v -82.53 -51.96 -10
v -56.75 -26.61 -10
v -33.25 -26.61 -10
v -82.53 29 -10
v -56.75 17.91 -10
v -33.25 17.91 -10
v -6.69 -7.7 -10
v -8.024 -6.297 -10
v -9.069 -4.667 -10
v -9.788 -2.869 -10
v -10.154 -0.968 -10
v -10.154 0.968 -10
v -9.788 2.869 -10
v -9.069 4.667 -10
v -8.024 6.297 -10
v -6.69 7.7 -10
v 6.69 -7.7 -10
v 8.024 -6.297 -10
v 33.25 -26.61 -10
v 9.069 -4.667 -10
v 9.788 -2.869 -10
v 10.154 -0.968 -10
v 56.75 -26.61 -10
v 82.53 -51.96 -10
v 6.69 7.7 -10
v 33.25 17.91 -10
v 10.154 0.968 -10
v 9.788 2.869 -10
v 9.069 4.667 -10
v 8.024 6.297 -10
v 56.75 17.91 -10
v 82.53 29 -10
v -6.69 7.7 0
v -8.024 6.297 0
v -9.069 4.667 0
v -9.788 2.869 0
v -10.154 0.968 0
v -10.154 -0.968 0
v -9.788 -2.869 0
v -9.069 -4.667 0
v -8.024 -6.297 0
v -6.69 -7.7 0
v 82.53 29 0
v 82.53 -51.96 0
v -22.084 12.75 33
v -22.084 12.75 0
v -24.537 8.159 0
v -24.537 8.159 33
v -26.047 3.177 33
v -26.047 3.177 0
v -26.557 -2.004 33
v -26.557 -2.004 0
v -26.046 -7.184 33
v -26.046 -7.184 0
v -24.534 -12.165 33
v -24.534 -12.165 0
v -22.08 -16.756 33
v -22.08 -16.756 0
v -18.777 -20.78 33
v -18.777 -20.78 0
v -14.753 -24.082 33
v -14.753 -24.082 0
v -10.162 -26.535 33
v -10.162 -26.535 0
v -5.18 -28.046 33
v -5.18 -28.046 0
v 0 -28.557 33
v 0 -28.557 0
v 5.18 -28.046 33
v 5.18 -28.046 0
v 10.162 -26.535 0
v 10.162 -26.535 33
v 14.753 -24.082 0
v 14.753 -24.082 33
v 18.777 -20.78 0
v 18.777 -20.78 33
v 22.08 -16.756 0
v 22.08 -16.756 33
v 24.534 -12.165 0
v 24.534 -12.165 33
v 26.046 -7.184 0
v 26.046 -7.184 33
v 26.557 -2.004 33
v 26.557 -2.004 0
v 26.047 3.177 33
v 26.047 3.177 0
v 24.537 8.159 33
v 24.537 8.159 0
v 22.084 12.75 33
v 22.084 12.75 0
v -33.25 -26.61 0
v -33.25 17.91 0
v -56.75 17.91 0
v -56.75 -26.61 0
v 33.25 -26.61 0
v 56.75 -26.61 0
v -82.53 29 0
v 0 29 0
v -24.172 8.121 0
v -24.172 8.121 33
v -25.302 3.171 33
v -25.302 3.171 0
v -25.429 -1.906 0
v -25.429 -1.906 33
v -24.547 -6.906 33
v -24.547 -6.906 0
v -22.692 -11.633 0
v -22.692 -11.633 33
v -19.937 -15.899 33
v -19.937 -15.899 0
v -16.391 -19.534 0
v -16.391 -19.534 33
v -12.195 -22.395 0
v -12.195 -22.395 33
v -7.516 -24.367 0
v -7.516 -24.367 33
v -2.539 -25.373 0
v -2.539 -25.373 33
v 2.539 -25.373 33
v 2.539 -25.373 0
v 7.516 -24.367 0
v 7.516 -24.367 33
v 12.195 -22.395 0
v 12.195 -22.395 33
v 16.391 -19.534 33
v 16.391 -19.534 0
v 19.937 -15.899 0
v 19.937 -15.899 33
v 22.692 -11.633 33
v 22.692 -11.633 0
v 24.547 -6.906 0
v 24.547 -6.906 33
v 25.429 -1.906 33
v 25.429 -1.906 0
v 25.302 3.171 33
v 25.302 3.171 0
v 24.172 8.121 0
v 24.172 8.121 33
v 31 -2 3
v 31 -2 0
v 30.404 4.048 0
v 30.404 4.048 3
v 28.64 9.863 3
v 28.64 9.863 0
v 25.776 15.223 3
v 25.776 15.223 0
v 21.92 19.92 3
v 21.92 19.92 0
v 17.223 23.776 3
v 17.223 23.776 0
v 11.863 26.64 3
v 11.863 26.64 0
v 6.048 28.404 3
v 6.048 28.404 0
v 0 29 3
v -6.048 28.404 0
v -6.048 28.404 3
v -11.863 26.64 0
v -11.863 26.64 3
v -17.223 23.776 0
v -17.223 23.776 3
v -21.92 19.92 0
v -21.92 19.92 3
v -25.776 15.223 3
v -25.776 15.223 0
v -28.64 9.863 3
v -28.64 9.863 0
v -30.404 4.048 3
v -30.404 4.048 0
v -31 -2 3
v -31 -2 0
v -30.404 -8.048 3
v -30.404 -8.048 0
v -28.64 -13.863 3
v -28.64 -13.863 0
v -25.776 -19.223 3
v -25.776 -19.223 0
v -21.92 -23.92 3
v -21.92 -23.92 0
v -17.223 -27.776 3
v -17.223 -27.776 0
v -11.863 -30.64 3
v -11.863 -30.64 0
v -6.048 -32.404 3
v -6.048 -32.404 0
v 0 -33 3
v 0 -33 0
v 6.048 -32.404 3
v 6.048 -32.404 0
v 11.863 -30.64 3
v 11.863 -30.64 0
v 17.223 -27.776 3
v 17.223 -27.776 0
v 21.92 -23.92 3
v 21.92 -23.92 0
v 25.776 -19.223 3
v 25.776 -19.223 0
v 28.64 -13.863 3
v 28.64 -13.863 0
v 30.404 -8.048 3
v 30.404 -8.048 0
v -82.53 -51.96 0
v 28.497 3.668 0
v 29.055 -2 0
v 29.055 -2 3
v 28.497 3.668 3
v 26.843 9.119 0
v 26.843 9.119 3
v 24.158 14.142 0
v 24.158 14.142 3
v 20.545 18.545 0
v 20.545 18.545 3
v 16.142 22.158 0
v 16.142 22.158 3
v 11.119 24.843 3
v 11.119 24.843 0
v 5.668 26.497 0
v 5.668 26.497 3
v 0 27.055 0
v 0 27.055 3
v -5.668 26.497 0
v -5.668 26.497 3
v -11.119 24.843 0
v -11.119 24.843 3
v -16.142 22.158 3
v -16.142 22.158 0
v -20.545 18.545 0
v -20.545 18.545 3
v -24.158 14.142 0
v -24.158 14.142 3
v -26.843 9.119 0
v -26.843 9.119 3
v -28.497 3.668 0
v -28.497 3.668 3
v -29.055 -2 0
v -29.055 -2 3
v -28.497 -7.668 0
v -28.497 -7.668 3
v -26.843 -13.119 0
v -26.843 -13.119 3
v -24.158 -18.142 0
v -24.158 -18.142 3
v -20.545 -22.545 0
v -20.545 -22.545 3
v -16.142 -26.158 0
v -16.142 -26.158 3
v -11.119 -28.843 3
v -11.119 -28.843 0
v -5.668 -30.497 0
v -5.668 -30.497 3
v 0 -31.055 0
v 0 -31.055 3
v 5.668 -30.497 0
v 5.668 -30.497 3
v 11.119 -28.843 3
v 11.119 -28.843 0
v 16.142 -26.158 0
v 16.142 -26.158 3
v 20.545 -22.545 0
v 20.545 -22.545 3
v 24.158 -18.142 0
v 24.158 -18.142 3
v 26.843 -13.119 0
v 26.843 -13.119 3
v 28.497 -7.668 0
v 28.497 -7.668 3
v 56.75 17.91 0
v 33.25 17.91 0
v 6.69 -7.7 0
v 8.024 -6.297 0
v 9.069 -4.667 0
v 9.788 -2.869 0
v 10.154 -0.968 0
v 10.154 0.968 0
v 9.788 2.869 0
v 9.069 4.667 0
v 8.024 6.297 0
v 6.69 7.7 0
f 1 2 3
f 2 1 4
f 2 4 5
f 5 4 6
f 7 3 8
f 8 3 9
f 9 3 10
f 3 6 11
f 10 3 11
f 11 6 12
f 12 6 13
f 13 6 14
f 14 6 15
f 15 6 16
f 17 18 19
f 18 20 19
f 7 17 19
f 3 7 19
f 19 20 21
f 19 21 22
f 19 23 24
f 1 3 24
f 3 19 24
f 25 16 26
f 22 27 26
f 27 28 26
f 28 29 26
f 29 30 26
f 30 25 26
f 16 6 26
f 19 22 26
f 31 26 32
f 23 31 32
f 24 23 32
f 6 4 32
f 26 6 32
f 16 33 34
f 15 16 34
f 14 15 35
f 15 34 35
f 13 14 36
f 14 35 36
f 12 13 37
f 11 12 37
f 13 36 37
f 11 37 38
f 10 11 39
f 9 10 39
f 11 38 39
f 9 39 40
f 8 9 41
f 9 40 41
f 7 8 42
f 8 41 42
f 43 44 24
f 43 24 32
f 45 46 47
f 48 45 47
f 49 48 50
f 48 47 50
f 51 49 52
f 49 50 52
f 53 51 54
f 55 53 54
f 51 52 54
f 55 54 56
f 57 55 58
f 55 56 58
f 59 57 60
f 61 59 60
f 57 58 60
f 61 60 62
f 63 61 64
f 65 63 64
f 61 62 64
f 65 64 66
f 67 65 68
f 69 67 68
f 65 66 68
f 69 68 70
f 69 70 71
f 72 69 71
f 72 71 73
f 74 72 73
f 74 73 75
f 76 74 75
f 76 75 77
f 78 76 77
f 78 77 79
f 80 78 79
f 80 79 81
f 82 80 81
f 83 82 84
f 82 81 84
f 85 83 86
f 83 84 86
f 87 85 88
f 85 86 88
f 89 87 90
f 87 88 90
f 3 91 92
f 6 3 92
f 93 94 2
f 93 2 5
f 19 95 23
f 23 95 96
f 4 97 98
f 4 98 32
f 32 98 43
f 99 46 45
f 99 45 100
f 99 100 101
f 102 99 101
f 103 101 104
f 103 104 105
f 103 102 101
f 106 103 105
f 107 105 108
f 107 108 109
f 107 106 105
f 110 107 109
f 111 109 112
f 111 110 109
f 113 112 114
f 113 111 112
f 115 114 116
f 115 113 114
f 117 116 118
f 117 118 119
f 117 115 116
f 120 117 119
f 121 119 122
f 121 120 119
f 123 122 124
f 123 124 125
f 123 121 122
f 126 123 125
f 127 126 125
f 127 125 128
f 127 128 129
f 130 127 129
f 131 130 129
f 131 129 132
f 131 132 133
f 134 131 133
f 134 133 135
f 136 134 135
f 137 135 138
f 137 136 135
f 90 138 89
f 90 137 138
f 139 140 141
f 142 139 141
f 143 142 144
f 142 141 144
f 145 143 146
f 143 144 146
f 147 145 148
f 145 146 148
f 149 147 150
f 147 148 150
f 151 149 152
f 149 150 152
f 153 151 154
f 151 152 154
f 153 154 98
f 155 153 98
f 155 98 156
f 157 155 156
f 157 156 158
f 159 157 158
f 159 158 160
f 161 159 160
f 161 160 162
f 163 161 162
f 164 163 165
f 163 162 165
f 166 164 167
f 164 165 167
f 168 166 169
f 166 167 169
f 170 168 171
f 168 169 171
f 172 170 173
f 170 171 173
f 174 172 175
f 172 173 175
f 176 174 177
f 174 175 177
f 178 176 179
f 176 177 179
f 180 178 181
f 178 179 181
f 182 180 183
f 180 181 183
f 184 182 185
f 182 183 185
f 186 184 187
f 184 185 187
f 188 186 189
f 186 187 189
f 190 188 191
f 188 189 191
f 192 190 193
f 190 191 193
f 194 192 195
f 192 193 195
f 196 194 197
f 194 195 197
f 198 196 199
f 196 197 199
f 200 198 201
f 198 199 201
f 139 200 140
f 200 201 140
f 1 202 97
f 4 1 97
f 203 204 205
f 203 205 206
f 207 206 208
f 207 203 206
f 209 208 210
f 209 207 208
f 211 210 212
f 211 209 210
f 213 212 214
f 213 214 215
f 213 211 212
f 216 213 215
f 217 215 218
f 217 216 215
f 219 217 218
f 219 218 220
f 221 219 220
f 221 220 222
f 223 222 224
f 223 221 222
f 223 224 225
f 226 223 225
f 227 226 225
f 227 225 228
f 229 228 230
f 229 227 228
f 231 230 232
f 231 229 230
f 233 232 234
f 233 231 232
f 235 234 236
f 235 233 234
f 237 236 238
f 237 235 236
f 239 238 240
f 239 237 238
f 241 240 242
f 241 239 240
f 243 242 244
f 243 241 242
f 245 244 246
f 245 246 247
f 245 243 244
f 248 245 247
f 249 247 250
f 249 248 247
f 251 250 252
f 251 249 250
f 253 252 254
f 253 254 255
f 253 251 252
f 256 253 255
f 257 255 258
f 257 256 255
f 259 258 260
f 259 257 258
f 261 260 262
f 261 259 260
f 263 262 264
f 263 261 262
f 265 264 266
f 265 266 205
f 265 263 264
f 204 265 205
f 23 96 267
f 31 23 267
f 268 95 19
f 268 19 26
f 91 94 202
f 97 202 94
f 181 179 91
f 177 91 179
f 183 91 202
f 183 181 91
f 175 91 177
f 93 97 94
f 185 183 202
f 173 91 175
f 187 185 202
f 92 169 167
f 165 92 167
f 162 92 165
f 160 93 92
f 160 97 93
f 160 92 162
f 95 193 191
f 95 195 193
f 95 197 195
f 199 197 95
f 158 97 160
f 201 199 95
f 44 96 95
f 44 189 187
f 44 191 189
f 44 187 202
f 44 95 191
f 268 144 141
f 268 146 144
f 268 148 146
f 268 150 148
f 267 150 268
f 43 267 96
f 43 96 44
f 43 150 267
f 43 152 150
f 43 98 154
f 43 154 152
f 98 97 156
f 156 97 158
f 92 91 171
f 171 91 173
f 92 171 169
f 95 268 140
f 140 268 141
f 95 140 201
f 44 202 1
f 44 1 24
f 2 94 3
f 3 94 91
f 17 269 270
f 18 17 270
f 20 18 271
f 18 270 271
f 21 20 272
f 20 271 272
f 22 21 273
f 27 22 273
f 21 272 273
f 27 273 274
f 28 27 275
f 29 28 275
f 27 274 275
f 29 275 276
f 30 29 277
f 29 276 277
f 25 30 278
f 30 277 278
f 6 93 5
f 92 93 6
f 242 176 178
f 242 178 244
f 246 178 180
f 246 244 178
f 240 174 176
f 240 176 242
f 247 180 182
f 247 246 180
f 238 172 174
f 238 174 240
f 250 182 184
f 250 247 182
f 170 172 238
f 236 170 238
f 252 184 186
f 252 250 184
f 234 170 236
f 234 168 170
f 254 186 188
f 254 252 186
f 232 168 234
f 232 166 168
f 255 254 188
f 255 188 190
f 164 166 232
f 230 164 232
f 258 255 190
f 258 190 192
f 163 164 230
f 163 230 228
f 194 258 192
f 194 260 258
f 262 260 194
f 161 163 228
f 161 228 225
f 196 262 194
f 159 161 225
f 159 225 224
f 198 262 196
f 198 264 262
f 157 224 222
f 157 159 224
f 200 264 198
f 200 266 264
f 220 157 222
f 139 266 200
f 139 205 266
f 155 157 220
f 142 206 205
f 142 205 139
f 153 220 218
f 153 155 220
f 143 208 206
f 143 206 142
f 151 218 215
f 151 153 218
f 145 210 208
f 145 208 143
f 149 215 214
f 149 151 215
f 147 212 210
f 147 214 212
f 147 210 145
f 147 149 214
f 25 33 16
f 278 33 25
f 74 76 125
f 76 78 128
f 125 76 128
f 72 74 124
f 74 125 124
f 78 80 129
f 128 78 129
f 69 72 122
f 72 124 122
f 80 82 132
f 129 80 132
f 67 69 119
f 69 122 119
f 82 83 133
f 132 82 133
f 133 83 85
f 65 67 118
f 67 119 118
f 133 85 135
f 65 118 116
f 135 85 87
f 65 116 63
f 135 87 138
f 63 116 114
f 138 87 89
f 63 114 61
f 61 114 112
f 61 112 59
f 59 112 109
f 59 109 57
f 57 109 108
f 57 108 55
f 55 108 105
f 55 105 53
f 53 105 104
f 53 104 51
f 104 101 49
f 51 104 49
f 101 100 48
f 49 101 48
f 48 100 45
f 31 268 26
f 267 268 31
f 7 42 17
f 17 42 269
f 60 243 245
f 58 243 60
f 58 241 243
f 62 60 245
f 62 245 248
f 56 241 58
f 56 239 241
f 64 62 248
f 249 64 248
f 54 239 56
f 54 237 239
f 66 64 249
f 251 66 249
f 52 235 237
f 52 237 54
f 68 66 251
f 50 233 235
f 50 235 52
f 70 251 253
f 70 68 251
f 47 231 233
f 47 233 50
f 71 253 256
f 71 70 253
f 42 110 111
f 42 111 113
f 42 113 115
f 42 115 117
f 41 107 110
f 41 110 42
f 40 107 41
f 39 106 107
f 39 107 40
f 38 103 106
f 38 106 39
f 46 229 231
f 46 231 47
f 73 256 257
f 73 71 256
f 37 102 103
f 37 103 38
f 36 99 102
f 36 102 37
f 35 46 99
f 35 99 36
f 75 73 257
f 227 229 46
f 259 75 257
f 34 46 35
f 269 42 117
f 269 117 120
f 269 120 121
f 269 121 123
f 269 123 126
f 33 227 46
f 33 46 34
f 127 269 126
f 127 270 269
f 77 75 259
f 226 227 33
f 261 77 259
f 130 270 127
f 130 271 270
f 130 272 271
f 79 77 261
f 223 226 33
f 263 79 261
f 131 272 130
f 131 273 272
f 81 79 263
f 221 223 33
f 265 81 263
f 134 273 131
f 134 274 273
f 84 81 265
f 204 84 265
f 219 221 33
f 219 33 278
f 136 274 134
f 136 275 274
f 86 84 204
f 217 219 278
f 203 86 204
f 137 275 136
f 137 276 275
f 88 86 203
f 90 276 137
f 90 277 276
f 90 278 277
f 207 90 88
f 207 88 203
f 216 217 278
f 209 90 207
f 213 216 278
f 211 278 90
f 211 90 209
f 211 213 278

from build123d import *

# Parameters (mm, degrees)
PAD002_DEPTH  = 33
SKETCH003_W   = 165.06
SKETCH003_H   = 80.96
SKETCH003_W_2 = 23.5
SKETCH003_H_2 = 44.52
PAD003_DEPTH  = 10
SKETCH004_R   = 31
SKETCH004_R_2 = 29.055
PAD004_DEPTH  = 3


with BuildPart() as part:
    # Sketch002 → Pad002 (new body)
    with BuildSketch(Plane.XY):
        with BuildLine():
            ThreePointArc((-22.083648, 12.75), (0, -25.5), (22.083648, 12.75))
            ThreePointArc((-22.083648, 12.75), (0, -28.556543), (22.083648, 12.75))
        make_face()
    extrude(amount=PAD002_DEPTH)

    # Sketch003 → Pad003 (join)
    with BuildSketch(Plane.XY):
        with Locations((0, -11.48)):
            Rectangle(SKETCH003_W, SKETCH003_H)
        with BuildLine():
            ThreePointArc((-6.689544, 7.7), (-10.2, 0), (-6.689544, -7.7))
            Line((-6.689544, -7.7), (6.689544, -7.7))
            ThreePointArc((6.689544, -7.7), (10.2, 0), (6.689544, 7.7))
            Line((-6.689544, 7.7), (6.689544, 7.7))
        make_face(mode=Mode.SUBTRACT)
        with Locations((45, -4.35)):
            Rectangle(SKETCH003_W_2, SKETCH003_H_2, mode=Mode.SUBTRACT)
        with Locations((-45, -4.35)):
            Rectangle(SKETCH003_W_2, SKETCH003_H_2, mode=Mode.SUBTRACT)
    extrude(amount=-PAD003_DEPTH)

    # Sketch004 (on Face3 of Pad003) → Pad004 (join)
    with BuildSketch(Plane.XY):
        with Locations((0, -2)):
            Circle(SKETCH004_R)
        with Locations((0, -2)):
            Circle(SKETCH004_R_2, mode=Mode.SUBTRACT)
    extrude(amount=PAD004_DEPTH)


solid = part.part
